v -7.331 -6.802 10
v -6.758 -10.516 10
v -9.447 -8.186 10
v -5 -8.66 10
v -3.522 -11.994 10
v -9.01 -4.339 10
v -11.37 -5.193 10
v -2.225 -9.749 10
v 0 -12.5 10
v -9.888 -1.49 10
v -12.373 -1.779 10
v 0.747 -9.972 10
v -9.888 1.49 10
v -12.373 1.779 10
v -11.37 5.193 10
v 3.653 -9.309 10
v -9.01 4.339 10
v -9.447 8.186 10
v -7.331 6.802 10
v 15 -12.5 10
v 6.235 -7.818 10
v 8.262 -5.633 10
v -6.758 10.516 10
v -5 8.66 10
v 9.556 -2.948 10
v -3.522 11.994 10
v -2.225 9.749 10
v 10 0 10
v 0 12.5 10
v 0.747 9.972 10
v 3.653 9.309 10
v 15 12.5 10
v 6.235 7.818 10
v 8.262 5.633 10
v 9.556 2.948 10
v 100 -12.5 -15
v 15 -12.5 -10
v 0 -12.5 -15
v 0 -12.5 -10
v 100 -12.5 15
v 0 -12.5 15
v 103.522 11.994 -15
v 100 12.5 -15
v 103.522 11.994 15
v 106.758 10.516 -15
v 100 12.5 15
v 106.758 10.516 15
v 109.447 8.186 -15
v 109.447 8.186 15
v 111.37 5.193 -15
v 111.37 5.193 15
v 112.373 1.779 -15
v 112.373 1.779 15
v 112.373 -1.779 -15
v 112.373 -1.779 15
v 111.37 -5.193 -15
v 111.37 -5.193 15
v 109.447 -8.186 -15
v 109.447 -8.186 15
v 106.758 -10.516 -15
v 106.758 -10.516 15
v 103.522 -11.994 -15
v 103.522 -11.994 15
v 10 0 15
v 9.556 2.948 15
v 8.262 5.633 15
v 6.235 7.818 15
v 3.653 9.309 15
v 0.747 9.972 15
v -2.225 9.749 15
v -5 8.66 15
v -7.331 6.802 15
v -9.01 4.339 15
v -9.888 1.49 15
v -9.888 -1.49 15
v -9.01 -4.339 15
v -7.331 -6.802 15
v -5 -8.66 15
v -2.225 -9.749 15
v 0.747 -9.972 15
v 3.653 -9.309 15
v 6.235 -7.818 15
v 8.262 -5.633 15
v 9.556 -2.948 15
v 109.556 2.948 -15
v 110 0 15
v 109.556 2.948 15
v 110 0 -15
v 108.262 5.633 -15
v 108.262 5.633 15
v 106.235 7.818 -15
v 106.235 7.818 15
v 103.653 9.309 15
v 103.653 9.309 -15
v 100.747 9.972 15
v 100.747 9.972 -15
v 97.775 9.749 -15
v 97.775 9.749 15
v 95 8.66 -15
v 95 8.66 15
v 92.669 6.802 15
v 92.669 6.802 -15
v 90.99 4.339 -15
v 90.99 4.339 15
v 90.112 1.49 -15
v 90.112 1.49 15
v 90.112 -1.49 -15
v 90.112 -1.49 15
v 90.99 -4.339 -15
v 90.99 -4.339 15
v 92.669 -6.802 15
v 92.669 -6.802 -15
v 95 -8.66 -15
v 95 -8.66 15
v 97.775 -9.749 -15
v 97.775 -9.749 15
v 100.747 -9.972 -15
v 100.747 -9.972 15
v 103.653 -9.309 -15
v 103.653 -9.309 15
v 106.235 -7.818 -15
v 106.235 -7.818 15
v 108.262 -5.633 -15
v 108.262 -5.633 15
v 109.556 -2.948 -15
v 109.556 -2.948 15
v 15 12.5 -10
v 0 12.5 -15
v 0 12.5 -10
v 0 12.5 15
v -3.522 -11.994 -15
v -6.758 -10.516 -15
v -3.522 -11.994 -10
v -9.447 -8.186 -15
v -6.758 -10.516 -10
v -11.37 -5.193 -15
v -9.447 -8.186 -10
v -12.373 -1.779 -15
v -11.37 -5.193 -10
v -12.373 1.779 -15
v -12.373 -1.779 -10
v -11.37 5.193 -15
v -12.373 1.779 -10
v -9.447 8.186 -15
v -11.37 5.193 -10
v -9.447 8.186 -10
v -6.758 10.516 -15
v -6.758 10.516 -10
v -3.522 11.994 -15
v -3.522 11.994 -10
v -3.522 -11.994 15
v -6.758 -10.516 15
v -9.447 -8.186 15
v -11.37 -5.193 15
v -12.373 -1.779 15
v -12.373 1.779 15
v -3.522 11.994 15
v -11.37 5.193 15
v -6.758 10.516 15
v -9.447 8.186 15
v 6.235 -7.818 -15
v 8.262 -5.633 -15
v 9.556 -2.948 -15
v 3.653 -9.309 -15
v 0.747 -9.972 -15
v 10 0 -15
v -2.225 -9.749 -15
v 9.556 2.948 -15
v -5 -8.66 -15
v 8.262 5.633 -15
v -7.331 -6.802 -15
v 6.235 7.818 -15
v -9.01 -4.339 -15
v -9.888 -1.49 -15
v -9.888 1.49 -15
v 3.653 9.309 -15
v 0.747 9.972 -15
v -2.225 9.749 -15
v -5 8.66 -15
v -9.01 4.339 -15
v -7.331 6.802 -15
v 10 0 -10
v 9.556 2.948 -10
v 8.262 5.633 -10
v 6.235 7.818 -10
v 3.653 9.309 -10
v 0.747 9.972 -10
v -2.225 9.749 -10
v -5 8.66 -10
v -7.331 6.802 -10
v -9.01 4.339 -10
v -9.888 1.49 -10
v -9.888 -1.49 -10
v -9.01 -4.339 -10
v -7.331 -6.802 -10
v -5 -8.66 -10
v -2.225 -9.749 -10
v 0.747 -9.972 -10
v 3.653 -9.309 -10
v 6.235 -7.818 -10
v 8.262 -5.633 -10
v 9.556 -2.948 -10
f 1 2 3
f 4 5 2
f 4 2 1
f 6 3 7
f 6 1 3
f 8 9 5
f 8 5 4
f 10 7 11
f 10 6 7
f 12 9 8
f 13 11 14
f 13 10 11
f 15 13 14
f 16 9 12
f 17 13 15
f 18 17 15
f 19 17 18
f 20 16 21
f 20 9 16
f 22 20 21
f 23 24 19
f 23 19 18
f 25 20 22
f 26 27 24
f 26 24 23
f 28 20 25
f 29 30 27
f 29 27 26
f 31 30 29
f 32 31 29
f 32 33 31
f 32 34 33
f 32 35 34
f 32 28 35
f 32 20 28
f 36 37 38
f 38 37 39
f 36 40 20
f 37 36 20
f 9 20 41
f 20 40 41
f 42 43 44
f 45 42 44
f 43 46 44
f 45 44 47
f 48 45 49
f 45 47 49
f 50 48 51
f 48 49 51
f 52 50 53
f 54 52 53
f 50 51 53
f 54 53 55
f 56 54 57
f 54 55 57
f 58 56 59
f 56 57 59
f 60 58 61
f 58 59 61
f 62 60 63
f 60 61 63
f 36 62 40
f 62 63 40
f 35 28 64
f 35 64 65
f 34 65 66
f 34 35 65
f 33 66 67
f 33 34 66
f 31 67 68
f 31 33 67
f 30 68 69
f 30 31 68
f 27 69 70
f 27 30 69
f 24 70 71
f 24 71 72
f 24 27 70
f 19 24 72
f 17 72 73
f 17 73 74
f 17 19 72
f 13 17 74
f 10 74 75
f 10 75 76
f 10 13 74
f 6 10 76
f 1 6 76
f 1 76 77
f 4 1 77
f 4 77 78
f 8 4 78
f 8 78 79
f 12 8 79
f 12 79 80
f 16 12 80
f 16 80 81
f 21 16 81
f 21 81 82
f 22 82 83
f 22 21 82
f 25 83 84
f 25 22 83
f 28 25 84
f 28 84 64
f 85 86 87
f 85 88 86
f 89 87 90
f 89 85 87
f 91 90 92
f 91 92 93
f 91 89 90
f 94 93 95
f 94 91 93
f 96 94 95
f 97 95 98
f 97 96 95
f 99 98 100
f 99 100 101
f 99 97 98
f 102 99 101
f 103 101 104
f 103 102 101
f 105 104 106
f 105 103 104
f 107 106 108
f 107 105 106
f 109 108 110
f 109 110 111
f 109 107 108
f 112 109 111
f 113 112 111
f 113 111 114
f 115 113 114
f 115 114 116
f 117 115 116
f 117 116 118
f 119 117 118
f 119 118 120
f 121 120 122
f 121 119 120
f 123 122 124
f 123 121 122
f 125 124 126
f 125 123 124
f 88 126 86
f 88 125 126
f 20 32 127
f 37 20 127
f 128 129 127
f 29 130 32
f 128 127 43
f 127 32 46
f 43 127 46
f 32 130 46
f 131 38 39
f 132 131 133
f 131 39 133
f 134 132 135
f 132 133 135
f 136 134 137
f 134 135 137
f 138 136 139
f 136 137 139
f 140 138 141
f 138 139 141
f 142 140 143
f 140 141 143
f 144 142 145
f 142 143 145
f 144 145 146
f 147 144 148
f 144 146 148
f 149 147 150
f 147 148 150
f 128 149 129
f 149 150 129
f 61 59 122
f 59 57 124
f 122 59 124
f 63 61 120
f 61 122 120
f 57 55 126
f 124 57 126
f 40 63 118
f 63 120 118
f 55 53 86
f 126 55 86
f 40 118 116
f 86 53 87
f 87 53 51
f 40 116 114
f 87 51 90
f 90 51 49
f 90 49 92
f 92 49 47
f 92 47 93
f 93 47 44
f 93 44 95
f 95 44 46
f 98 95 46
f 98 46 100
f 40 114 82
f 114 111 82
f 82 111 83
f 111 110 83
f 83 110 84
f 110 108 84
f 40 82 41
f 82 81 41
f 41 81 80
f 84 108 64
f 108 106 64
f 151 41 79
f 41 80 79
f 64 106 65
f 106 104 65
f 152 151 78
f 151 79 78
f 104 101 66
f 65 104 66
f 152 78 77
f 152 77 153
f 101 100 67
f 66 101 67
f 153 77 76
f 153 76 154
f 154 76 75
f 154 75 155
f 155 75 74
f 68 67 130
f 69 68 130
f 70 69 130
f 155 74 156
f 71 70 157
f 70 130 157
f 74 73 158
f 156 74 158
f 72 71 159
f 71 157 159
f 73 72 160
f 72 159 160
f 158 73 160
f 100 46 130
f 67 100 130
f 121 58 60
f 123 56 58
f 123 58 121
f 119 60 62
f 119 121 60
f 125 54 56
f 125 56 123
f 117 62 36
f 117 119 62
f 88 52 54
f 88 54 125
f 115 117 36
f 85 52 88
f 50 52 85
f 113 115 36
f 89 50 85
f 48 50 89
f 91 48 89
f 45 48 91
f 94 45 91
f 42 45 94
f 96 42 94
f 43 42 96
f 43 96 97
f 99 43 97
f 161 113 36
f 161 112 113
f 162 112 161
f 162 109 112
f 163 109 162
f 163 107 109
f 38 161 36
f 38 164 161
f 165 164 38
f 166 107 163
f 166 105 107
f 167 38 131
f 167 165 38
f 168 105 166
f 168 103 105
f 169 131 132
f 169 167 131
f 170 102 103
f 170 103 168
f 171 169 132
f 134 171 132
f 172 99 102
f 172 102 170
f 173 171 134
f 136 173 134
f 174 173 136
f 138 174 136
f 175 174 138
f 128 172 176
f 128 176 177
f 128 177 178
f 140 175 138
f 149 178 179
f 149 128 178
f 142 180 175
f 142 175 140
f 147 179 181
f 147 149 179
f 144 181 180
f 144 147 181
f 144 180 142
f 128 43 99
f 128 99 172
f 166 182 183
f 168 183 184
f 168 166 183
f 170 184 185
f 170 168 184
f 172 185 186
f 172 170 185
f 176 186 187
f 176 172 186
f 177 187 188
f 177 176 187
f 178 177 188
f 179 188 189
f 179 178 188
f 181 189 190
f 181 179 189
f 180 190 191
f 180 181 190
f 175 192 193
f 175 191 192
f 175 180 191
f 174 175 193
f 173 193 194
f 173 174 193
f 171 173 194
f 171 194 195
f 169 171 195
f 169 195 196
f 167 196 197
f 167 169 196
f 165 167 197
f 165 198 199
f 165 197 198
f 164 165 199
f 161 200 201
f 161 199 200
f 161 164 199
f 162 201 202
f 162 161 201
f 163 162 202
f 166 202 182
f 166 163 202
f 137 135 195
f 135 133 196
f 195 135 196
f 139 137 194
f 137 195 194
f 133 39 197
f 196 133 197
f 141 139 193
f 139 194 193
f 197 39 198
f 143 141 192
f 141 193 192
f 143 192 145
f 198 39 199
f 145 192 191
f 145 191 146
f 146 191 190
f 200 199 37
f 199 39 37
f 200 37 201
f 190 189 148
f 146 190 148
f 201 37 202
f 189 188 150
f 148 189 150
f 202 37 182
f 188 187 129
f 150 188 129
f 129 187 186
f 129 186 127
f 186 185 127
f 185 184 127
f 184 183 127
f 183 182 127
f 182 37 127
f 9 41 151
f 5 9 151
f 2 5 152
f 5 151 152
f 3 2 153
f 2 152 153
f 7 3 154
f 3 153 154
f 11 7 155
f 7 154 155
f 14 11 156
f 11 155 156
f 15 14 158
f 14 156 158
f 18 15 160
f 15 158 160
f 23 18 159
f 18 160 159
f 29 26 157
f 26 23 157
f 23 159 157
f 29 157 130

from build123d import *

# Parameters (mm, degrees)
SKETCH3_R           = 10
BOSS_EXTRUDE2_DEPTH = 15
SKETCH4_W           = 20
SKETCH4_H           = 25
CUT_EXTRUDE2_DEPTH  = 15


with BuildPart() as part:
    # Sketch3 → Boss-Extrude2 (new body, symmetric)
    with BuildSketch(Plane.XY):
        with BuildLine():
            Line((0, 12.5), (100, 12.5))
            ThreePointArc((100, 12.5), (112.5, 0), (100, -12.5))
            Line((100, -12.5), (0, -12.5))
            ThreePointArc((0, -12.5), (-12.5, 0), (0, 12.5))
        make_face()
        Circle(SKETCH3_R, mode=Mode.SUBTRACT)
        with Locations((100, 0)):
            Circle(SKETCH3_R, mode=Mode.SUBTRACT)
    extrude(amount=BOSS_EXTRUDE2_DEPTH, both=True)

    # Sketch4 → Cut-Extrude2 (cut, symmetric)
    with BuildSketch(Plane(origin=(0, 0, 0), x_dir=(0, 0, -1), z_dir=(1, 0, 0))):
        Rectangle(SKETCH4_W, SKETCH4_H)
    extrude(amount=CUT_EXTRUDE2_DEPTH, both=True, mode=Mode.SUBTRACT)


solid = part.part
